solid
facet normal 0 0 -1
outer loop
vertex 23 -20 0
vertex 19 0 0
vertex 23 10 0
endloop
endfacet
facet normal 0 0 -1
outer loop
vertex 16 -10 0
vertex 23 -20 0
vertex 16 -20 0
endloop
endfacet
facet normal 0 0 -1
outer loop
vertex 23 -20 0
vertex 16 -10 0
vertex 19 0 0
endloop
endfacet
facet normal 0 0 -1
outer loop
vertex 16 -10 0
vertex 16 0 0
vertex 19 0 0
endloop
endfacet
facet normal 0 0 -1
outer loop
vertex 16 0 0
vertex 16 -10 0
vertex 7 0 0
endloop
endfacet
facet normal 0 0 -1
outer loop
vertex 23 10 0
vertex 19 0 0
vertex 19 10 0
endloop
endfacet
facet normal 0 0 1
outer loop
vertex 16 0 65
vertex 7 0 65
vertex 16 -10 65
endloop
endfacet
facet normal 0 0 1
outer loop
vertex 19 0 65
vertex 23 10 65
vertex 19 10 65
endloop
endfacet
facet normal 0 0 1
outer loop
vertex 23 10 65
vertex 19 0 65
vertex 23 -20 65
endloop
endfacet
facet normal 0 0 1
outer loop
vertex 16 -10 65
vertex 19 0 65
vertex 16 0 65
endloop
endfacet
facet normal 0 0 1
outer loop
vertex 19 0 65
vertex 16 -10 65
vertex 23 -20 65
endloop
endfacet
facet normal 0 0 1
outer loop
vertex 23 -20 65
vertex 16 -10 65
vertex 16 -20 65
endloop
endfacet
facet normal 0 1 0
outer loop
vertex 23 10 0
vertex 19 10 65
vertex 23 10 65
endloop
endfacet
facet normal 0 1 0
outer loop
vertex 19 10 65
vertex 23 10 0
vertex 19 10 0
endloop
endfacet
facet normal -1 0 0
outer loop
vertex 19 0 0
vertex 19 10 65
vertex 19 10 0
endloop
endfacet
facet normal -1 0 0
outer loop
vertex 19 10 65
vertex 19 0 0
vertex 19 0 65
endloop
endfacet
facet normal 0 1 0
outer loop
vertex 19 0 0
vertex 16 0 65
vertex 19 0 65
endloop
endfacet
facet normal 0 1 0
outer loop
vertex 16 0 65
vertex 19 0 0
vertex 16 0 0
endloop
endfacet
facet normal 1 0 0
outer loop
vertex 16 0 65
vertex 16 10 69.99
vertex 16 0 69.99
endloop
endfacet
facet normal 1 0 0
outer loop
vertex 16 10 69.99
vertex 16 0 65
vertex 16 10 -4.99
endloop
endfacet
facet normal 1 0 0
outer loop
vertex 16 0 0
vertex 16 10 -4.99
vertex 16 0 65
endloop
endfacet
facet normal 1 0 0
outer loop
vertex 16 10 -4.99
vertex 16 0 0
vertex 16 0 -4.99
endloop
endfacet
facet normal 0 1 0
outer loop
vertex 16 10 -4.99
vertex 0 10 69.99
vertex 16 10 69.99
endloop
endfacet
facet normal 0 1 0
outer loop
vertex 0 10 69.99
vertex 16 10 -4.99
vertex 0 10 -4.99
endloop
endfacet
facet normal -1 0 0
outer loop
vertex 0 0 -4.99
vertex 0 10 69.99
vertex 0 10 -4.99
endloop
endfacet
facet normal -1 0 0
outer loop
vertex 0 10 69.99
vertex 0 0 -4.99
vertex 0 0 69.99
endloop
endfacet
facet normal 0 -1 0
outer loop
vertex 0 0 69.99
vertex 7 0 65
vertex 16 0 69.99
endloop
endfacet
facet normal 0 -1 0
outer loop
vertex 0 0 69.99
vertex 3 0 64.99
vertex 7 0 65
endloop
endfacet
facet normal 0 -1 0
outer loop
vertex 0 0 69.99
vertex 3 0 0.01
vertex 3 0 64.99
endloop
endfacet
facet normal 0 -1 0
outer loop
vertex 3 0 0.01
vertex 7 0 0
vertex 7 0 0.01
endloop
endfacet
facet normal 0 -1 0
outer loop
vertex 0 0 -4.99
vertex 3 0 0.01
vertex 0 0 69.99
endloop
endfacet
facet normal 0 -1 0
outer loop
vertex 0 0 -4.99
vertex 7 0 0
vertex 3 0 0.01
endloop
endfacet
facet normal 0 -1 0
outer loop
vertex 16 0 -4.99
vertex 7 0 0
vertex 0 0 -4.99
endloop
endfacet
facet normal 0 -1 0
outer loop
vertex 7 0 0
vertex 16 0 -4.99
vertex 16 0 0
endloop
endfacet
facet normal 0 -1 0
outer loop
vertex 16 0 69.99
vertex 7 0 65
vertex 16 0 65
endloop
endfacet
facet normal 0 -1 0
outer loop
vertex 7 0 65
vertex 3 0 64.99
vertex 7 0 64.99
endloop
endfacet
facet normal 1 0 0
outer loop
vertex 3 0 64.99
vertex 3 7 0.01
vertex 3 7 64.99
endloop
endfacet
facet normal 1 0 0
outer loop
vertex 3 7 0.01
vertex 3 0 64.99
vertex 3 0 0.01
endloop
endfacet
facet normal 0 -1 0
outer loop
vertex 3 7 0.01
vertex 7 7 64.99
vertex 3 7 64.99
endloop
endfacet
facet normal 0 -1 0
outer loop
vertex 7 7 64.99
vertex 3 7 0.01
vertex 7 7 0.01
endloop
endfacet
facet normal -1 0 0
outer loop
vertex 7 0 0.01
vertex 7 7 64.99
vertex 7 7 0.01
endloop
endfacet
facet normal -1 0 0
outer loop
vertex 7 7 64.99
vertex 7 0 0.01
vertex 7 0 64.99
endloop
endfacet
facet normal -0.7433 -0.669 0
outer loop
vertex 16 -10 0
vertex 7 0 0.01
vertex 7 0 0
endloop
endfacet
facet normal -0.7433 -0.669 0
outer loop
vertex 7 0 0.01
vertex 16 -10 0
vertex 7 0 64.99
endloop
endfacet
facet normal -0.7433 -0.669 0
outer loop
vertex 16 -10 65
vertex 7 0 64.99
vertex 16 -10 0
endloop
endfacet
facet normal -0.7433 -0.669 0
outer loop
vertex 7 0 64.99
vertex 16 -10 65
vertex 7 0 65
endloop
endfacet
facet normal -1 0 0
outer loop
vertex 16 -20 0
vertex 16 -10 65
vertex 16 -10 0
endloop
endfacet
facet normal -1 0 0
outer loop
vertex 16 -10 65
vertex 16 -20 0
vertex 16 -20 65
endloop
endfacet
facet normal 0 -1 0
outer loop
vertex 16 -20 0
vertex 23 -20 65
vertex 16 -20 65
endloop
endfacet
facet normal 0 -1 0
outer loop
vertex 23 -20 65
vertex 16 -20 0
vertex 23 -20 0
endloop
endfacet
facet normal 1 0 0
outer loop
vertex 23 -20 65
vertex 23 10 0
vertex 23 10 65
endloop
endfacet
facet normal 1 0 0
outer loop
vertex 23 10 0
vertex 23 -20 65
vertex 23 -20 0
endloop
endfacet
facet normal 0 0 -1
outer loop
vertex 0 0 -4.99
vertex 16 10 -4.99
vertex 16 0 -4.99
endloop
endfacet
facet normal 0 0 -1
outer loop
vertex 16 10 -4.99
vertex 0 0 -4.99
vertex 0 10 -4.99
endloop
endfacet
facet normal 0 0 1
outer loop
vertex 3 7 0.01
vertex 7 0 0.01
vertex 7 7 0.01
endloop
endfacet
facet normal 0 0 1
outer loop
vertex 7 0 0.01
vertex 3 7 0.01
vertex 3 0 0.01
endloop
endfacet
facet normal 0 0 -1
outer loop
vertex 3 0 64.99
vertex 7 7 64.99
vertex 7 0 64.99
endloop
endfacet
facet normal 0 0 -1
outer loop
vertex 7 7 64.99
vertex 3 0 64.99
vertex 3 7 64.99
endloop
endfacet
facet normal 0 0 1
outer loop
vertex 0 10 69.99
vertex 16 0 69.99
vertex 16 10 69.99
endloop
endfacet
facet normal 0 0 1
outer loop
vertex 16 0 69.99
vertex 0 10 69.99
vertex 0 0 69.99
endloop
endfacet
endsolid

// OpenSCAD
/*
Copyright (C) Saeed Gholami Shahbandi. All rights reserved.
Author: Saeed Gholami Shahbandi (saeed.gh.sh@gmail.com)

This file is part of Arrangement Library.
The of Arrangement Library is free software: you can redistribute it and/or
modify it under the terms of the GNU Lesser General Public License as published
by the Free Software Foundation, either version 3 of the License,
or (at your option) any later version.

This program is distributed in the hope that it will be useful, but WITHOUT ANY
WARRANTY; without even the implied warranty of MERCHANTABILITY or FITNESS FOR A
PARTICULAR PURPOSE. See the GNU Lesser General Public License for more details.

You should have received a copy of the GNU Lesser General Public License along
with this program. If not, see <http://www.gnu.org/licenses/>
*/
tol = 0.01;

/*
          _____   _
         |  _  |_| |
(0,0)->  |_| |     |
              \__  |
                 | |
                 | |
                 | |
                 |_|
*/
points = [
     [0, 0],		// A
     [0, 10],		// B
     [16, 10],		// C
     [16, 0],		// D
     [19, 0],		// E
     [19, 10],		// F
     [23, 10],		// G
     [23, -20],		// H
     [16, -20],		// I
     [16, -10],	        // J
     [7, -0],	        // K
     [7, 7],		// L
     [3, 7],		// M
     [3, 0],		// N
     ];

points_2 = [
     [0, 0],		// A
     [0, 10],		// B
     [16, 10],		// C
     [16, 0],		// D
     ];

union(){
     linear_extrude(height = 65)
          polygon(points);

     translate([0, 0, -(5-tol)])
     linear_extrude(height = 5)
          polygon(points_2);

     translate([0, 0, 65-tol])
     linear_extrude(height = 5)
          polygon(points_2);
}
